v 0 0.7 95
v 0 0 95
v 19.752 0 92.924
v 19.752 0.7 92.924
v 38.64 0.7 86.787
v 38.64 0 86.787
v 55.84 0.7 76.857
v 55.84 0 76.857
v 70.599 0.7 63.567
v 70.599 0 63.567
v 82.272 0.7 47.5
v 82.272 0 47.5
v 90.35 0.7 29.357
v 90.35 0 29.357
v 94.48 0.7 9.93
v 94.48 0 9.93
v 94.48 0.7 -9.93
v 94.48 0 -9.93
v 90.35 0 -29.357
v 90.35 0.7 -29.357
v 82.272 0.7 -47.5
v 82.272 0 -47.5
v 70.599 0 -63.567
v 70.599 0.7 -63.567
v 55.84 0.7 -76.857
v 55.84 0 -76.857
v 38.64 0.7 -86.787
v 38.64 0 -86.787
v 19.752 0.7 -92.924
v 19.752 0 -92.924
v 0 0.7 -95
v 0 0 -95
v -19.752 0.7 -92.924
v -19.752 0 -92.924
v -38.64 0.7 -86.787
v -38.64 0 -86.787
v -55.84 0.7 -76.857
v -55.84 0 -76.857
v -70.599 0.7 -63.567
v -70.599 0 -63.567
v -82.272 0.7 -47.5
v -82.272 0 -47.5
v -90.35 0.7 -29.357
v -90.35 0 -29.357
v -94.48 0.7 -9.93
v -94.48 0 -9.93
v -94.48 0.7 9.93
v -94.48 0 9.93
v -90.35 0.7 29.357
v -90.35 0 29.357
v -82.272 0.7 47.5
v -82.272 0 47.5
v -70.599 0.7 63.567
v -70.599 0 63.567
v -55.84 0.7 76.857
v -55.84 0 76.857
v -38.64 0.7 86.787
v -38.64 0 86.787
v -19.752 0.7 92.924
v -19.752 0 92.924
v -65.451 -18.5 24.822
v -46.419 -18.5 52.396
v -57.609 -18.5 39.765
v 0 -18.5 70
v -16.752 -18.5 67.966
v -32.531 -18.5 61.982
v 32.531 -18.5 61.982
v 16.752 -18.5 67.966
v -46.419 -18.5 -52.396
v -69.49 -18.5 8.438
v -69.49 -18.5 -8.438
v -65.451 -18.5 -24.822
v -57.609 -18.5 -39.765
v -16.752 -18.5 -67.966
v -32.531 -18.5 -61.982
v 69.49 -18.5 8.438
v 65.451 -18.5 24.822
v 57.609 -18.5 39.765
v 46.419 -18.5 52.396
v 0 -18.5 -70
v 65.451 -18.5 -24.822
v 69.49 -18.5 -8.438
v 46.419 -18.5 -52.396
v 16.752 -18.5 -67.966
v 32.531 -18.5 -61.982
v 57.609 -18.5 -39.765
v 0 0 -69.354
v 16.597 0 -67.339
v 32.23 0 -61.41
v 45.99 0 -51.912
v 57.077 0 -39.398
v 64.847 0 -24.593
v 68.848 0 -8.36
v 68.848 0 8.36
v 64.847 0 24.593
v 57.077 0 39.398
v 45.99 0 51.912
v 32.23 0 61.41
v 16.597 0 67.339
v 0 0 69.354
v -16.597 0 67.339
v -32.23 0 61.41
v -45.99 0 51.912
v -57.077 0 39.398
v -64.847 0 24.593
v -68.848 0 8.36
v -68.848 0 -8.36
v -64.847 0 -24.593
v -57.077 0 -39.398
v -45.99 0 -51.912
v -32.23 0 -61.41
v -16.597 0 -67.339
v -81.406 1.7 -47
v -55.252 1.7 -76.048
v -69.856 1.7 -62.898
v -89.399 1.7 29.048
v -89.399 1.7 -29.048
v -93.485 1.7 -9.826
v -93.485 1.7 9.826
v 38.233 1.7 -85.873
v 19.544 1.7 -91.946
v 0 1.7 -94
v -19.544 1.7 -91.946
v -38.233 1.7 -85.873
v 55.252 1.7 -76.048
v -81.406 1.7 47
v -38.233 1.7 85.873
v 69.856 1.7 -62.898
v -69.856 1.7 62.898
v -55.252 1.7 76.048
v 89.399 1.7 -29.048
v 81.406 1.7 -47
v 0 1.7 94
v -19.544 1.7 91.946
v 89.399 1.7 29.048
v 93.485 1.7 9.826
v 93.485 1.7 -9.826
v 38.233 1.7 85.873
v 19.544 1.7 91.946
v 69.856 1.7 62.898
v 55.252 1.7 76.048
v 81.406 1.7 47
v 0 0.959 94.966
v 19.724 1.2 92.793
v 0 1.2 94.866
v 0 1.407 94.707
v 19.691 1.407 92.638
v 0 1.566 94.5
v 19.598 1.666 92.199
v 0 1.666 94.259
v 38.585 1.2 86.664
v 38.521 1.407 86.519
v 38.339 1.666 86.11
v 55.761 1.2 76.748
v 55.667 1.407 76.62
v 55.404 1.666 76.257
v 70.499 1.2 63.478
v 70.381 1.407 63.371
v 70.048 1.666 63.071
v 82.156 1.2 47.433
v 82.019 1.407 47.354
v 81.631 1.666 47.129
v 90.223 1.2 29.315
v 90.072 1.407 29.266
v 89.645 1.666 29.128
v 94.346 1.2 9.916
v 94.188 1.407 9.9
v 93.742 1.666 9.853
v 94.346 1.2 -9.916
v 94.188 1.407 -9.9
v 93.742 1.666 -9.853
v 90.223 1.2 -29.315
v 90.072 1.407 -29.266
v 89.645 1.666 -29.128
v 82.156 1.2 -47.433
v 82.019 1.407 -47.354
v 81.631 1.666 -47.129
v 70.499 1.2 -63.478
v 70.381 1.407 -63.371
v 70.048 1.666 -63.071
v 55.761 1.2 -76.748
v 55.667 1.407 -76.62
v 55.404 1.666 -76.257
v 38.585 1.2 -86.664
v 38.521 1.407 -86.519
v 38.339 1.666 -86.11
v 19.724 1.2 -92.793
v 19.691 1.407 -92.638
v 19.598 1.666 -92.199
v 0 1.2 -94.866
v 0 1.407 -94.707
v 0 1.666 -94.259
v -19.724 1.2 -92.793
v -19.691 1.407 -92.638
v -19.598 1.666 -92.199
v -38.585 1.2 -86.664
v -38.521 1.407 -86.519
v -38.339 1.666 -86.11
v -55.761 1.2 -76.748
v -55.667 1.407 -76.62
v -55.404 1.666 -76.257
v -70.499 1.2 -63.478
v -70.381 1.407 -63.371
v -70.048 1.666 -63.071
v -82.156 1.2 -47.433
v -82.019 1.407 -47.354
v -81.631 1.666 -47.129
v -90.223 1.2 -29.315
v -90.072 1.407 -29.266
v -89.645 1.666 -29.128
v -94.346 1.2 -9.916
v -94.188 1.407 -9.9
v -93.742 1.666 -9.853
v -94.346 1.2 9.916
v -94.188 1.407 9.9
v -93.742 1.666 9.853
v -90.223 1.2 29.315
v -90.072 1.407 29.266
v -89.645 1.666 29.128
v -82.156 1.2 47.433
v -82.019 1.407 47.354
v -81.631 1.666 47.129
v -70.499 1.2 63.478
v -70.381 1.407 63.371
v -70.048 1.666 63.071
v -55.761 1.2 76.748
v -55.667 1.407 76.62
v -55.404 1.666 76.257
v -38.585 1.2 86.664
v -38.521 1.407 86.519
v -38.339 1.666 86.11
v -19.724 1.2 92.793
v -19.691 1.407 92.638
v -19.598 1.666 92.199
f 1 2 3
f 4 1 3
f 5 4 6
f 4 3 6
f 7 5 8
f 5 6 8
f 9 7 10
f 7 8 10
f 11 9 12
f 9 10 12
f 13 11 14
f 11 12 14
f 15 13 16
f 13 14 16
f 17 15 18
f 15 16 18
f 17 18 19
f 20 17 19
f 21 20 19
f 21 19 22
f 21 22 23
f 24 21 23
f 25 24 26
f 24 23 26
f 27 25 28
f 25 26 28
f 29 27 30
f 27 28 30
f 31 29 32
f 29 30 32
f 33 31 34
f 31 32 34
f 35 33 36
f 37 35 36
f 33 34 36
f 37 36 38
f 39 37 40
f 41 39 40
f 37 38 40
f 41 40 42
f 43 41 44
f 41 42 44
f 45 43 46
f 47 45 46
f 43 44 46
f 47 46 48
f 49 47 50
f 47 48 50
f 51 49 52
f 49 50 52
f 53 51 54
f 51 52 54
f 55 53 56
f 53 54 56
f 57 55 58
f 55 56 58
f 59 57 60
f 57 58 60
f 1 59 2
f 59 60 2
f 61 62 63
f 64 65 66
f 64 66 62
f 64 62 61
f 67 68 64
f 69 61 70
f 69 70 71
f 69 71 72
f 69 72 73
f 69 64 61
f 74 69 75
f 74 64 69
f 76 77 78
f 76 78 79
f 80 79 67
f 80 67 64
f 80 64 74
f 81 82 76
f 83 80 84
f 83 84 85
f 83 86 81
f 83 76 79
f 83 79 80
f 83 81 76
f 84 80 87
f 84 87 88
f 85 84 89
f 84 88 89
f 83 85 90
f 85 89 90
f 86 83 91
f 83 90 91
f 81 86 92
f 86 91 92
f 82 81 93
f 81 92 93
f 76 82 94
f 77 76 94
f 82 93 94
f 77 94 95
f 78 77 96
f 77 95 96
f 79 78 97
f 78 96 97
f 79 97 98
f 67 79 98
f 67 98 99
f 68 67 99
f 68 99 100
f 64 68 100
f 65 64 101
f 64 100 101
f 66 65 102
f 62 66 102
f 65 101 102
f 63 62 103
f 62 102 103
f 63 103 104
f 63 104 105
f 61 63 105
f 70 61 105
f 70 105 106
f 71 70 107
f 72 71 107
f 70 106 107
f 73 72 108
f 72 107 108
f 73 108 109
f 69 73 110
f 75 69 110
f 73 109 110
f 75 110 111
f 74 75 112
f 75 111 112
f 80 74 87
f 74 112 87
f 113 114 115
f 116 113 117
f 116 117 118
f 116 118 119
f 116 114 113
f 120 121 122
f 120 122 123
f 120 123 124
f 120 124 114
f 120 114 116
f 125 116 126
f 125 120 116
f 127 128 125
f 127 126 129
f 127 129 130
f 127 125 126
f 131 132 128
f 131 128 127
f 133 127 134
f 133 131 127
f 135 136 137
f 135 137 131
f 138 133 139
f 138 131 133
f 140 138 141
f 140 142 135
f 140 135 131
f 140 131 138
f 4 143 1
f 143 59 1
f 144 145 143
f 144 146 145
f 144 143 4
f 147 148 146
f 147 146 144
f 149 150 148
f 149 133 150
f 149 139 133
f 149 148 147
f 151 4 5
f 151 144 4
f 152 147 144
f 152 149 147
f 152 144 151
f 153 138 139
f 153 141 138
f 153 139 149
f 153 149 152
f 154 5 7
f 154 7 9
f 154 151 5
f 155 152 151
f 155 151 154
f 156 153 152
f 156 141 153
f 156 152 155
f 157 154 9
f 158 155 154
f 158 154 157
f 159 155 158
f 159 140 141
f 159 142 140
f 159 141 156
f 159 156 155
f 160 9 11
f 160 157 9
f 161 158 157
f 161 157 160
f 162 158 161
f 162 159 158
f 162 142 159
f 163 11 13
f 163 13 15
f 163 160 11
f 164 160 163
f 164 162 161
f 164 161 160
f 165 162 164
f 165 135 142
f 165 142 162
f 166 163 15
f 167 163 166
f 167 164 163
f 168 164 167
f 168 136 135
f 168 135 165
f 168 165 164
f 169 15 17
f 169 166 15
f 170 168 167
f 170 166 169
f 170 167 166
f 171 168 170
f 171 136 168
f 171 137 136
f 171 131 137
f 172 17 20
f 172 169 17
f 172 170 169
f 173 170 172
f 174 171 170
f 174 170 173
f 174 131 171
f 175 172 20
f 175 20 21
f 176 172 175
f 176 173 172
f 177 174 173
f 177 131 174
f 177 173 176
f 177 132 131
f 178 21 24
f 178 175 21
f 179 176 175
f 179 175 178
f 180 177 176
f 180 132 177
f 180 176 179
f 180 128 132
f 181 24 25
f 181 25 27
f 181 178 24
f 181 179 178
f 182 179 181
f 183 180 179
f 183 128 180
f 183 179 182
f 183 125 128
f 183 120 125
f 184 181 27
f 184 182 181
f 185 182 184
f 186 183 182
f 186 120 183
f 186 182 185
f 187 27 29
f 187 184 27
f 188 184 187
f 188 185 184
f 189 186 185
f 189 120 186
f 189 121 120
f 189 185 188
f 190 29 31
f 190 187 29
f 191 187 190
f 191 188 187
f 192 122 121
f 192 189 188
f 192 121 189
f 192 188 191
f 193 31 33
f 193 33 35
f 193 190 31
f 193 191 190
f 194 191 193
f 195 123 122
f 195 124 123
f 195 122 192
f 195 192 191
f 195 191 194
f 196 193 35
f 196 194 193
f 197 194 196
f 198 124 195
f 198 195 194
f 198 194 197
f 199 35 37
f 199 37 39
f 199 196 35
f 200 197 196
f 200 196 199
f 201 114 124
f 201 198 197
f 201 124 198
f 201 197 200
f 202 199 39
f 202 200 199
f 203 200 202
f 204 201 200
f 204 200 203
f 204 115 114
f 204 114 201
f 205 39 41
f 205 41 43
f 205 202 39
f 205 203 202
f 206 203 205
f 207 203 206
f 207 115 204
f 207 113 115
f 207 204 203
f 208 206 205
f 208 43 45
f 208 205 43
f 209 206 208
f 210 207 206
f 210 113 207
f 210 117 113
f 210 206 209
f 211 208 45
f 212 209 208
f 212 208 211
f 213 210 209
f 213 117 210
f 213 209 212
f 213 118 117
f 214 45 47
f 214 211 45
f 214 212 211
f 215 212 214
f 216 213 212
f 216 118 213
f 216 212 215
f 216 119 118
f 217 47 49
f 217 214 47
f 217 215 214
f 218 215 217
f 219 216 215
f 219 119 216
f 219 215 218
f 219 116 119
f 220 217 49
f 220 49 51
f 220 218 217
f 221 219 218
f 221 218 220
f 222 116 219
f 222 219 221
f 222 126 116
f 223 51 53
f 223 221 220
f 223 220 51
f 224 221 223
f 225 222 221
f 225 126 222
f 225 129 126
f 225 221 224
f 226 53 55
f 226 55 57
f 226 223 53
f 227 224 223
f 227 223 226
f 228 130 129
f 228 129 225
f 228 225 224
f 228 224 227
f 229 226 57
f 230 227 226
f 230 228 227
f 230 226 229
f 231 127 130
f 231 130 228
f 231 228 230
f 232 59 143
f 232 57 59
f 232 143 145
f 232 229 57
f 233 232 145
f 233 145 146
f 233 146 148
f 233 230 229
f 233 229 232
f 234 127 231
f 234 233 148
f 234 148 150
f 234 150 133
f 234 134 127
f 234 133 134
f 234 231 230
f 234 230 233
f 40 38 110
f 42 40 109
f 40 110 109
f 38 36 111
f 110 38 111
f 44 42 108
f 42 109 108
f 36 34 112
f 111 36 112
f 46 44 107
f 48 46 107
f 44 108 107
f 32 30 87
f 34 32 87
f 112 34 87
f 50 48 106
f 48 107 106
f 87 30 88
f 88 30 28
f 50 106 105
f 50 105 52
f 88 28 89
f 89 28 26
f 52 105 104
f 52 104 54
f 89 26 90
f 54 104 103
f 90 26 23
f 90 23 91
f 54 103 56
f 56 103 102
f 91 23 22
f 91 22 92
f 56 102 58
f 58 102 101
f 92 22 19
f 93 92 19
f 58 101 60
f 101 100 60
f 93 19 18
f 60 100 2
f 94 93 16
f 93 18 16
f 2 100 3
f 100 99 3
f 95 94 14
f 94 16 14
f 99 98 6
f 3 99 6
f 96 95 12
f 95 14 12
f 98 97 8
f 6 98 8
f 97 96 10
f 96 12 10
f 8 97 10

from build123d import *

# Parameters (mm, degrees)
SKETCH1_R           = 95
BOSS_EXTRUDE1_DEPTH = 1.7
FILLET1_R           = 1
SKETCH2_R           = 70
BOSS_EXTRUDE2_DEPTH = 18.5
DRAFT3_ANGLE        = -2


with BuildPart() as part:
    # Sketch1 → Boss-Extrude1 (new body)
    with BuildSketch(Plane(origin=(0, 0, 0), x_dir=(1, 0, 0), z_dir=(0, 1, 0))):
        with Locations(Location((0, 0, 0), (0, 0, 270))):
            Circle(SKETCH1_R)
    extrude(amount=BOSS_EXTRUDE1_DEPTH)

    # Fillet1
    fillet1_edges = [part.edges().sort_by_distance(p)[0] for p in [
        (0, 1.7, -95),
    ]]
    fillet(fillet1_edges, radius=FILLET1_R)

    # Sketch2 → Boss-Extrude2 (add)
    with BuildSketch(Plane.XZ):
        with Locations(Location((0, 0, 0), (0, 0, 270))):
            Circle(SKETCH2_R)
    extrude(amount=BOSS_EXTRUDE2_DEPTH)

    # Draft3
    draft3_faces = [part.faces().sort_by_distance(p)[0] for p in [
        (0, -9.25, 70),
    ]]
    draft(draft3_faces, Plane(origin=(0, -18.5, 0), x_dir=(0, 0, -1), z_dir=(0, -1, 0)), DRAFT3_ANGLE)


solid = part.part
